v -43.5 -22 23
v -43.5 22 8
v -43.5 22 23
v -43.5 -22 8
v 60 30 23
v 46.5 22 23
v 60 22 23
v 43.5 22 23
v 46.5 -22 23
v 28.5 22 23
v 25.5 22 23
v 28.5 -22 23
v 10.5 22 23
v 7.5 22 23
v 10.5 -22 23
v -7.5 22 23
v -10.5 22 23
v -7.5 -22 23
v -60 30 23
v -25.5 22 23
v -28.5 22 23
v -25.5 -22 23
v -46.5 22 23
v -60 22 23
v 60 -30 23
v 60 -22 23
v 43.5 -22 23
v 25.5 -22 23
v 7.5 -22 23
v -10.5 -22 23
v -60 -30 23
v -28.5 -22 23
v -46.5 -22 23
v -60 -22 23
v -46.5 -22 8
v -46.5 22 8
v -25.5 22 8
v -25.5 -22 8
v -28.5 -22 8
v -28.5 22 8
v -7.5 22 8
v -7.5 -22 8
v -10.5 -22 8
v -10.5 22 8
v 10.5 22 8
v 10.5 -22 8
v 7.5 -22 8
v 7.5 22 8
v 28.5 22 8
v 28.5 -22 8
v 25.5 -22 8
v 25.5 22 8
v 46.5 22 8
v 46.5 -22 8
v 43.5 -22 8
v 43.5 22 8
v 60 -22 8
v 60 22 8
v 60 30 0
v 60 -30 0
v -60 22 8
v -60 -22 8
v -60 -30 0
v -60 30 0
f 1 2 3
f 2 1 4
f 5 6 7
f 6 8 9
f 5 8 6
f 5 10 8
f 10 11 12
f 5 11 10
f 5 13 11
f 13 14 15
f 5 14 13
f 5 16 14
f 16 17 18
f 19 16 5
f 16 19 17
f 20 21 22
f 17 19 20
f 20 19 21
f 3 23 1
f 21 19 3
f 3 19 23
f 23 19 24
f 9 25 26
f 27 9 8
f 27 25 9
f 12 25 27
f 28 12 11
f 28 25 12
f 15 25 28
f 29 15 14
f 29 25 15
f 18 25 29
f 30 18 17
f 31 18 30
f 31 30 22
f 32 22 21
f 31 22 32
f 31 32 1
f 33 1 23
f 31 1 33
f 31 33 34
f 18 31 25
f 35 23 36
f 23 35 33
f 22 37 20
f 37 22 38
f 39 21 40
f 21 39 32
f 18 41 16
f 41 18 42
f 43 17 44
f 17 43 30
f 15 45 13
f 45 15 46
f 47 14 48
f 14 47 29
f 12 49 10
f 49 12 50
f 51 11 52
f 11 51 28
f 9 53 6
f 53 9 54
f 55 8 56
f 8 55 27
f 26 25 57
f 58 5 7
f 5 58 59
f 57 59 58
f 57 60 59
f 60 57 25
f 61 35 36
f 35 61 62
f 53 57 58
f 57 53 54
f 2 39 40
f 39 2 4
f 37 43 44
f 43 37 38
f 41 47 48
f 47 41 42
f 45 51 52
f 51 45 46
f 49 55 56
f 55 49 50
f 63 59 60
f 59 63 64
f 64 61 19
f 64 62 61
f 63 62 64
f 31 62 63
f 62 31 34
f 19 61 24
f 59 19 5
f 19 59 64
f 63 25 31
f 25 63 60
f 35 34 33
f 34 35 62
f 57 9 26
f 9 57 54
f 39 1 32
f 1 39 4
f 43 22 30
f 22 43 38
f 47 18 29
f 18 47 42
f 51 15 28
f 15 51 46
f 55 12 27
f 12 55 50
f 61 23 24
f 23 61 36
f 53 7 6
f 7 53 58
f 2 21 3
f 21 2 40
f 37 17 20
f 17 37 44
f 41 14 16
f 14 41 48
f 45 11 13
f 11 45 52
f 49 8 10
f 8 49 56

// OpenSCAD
$fn = 32;

// ----------------------------------------------------------------------
// Rib frame 120 x 60 x 23
// 6 ribs at 18 mm pitch
// ----------------------------------------------------------------------

// --- parameters (mm) ---
frame = [120, 60, 8];  // base plate size (x, y, z)
rail_w = 8;            // side rail width
ribs = 6;              // number of ribs
rib_t = 3;             // rib thickness
rib_h = 15;            // rib height above the base plate
pitch = 18;            // pitch between rib centres

// --- derived feature positions (mm) ---
span = (ribs - 1) * pitch;          // = 90   distance between the outer ribs
origin_x = -span / 2;               // = -45   X of the first rib
rib_len = frame[1] - 2 * rail_w + 2;  // = 46   rib length, 1 mm into each rail
feature_centers = [
  [origin_x + 0 * pitch, 0],
  [origin_x + 1 * pitch, 0],
  [origin_x + 2 * pitch, 0],
  [origin_x + 3 * pitch, 0],
  [origin_x + 4 * pitch, 0],
  [origin_x + 5 * pitch, 0]
];   // rib centre line, drives the rib loop

// base plate, two side rails, then the ribs read straight off feature_centers
union() {
  translate([-frame[0] / 2, -frame[1] / 2, 0]) cube(frame);
  translate([-frame[0] / 2, -frame[1] / 2, 0]) cube([frame[0], rail_w, frame[2] + rib_h]);
  translate([-frame[0] / 2, frame[1] / 2 - rail_w, 0]) cube([frame[0], rail_w, frame[2] + rib_h]);
  for (centre = feature_centers)
    translate([centre[0] - rib_t / 2, centre[1] - rib_len / 2, frame[2] - 1])
      cube([rib_t, rib_len, rib_h + 1]);
}
